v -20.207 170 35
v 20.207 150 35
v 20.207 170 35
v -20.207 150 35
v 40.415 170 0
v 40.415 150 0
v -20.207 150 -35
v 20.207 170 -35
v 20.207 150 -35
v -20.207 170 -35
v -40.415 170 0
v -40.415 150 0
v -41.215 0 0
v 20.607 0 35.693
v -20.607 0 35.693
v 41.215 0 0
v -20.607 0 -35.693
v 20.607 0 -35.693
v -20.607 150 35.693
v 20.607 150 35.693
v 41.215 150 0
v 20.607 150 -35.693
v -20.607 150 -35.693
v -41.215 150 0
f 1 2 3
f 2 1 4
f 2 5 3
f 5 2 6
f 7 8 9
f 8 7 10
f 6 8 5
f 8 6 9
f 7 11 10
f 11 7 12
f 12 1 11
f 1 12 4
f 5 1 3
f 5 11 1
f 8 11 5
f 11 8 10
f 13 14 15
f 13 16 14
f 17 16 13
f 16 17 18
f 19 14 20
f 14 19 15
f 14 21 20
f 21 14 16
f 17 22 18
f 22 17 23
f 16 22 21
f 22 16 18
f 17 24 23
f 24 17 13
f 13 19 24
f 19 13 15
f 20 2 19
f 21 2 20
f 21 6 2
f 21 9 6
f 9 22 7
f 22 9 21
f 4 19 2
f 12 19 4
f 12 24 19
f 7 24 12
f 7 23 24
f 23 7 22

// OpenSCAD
$fn=100;

// Total length of the case
length = 150;

// Sides
sides = 6;


// Inner radius of the hexagon
inner_rad = 35;
outer_rad = inner_rad / cos(360 / (sides * 2));

// Minimum wall thickness
min_wall_thickness = 0.8;


rotate([-90, 0, 0]){
    cylinder($fn = sides, r = outer_rad, h = length+20);
    cylinder($fn = sides, r = outer_rad + min_wall_thickness, h = length);

    cylinder( r = inner_rad, h = length+10);
    
}
